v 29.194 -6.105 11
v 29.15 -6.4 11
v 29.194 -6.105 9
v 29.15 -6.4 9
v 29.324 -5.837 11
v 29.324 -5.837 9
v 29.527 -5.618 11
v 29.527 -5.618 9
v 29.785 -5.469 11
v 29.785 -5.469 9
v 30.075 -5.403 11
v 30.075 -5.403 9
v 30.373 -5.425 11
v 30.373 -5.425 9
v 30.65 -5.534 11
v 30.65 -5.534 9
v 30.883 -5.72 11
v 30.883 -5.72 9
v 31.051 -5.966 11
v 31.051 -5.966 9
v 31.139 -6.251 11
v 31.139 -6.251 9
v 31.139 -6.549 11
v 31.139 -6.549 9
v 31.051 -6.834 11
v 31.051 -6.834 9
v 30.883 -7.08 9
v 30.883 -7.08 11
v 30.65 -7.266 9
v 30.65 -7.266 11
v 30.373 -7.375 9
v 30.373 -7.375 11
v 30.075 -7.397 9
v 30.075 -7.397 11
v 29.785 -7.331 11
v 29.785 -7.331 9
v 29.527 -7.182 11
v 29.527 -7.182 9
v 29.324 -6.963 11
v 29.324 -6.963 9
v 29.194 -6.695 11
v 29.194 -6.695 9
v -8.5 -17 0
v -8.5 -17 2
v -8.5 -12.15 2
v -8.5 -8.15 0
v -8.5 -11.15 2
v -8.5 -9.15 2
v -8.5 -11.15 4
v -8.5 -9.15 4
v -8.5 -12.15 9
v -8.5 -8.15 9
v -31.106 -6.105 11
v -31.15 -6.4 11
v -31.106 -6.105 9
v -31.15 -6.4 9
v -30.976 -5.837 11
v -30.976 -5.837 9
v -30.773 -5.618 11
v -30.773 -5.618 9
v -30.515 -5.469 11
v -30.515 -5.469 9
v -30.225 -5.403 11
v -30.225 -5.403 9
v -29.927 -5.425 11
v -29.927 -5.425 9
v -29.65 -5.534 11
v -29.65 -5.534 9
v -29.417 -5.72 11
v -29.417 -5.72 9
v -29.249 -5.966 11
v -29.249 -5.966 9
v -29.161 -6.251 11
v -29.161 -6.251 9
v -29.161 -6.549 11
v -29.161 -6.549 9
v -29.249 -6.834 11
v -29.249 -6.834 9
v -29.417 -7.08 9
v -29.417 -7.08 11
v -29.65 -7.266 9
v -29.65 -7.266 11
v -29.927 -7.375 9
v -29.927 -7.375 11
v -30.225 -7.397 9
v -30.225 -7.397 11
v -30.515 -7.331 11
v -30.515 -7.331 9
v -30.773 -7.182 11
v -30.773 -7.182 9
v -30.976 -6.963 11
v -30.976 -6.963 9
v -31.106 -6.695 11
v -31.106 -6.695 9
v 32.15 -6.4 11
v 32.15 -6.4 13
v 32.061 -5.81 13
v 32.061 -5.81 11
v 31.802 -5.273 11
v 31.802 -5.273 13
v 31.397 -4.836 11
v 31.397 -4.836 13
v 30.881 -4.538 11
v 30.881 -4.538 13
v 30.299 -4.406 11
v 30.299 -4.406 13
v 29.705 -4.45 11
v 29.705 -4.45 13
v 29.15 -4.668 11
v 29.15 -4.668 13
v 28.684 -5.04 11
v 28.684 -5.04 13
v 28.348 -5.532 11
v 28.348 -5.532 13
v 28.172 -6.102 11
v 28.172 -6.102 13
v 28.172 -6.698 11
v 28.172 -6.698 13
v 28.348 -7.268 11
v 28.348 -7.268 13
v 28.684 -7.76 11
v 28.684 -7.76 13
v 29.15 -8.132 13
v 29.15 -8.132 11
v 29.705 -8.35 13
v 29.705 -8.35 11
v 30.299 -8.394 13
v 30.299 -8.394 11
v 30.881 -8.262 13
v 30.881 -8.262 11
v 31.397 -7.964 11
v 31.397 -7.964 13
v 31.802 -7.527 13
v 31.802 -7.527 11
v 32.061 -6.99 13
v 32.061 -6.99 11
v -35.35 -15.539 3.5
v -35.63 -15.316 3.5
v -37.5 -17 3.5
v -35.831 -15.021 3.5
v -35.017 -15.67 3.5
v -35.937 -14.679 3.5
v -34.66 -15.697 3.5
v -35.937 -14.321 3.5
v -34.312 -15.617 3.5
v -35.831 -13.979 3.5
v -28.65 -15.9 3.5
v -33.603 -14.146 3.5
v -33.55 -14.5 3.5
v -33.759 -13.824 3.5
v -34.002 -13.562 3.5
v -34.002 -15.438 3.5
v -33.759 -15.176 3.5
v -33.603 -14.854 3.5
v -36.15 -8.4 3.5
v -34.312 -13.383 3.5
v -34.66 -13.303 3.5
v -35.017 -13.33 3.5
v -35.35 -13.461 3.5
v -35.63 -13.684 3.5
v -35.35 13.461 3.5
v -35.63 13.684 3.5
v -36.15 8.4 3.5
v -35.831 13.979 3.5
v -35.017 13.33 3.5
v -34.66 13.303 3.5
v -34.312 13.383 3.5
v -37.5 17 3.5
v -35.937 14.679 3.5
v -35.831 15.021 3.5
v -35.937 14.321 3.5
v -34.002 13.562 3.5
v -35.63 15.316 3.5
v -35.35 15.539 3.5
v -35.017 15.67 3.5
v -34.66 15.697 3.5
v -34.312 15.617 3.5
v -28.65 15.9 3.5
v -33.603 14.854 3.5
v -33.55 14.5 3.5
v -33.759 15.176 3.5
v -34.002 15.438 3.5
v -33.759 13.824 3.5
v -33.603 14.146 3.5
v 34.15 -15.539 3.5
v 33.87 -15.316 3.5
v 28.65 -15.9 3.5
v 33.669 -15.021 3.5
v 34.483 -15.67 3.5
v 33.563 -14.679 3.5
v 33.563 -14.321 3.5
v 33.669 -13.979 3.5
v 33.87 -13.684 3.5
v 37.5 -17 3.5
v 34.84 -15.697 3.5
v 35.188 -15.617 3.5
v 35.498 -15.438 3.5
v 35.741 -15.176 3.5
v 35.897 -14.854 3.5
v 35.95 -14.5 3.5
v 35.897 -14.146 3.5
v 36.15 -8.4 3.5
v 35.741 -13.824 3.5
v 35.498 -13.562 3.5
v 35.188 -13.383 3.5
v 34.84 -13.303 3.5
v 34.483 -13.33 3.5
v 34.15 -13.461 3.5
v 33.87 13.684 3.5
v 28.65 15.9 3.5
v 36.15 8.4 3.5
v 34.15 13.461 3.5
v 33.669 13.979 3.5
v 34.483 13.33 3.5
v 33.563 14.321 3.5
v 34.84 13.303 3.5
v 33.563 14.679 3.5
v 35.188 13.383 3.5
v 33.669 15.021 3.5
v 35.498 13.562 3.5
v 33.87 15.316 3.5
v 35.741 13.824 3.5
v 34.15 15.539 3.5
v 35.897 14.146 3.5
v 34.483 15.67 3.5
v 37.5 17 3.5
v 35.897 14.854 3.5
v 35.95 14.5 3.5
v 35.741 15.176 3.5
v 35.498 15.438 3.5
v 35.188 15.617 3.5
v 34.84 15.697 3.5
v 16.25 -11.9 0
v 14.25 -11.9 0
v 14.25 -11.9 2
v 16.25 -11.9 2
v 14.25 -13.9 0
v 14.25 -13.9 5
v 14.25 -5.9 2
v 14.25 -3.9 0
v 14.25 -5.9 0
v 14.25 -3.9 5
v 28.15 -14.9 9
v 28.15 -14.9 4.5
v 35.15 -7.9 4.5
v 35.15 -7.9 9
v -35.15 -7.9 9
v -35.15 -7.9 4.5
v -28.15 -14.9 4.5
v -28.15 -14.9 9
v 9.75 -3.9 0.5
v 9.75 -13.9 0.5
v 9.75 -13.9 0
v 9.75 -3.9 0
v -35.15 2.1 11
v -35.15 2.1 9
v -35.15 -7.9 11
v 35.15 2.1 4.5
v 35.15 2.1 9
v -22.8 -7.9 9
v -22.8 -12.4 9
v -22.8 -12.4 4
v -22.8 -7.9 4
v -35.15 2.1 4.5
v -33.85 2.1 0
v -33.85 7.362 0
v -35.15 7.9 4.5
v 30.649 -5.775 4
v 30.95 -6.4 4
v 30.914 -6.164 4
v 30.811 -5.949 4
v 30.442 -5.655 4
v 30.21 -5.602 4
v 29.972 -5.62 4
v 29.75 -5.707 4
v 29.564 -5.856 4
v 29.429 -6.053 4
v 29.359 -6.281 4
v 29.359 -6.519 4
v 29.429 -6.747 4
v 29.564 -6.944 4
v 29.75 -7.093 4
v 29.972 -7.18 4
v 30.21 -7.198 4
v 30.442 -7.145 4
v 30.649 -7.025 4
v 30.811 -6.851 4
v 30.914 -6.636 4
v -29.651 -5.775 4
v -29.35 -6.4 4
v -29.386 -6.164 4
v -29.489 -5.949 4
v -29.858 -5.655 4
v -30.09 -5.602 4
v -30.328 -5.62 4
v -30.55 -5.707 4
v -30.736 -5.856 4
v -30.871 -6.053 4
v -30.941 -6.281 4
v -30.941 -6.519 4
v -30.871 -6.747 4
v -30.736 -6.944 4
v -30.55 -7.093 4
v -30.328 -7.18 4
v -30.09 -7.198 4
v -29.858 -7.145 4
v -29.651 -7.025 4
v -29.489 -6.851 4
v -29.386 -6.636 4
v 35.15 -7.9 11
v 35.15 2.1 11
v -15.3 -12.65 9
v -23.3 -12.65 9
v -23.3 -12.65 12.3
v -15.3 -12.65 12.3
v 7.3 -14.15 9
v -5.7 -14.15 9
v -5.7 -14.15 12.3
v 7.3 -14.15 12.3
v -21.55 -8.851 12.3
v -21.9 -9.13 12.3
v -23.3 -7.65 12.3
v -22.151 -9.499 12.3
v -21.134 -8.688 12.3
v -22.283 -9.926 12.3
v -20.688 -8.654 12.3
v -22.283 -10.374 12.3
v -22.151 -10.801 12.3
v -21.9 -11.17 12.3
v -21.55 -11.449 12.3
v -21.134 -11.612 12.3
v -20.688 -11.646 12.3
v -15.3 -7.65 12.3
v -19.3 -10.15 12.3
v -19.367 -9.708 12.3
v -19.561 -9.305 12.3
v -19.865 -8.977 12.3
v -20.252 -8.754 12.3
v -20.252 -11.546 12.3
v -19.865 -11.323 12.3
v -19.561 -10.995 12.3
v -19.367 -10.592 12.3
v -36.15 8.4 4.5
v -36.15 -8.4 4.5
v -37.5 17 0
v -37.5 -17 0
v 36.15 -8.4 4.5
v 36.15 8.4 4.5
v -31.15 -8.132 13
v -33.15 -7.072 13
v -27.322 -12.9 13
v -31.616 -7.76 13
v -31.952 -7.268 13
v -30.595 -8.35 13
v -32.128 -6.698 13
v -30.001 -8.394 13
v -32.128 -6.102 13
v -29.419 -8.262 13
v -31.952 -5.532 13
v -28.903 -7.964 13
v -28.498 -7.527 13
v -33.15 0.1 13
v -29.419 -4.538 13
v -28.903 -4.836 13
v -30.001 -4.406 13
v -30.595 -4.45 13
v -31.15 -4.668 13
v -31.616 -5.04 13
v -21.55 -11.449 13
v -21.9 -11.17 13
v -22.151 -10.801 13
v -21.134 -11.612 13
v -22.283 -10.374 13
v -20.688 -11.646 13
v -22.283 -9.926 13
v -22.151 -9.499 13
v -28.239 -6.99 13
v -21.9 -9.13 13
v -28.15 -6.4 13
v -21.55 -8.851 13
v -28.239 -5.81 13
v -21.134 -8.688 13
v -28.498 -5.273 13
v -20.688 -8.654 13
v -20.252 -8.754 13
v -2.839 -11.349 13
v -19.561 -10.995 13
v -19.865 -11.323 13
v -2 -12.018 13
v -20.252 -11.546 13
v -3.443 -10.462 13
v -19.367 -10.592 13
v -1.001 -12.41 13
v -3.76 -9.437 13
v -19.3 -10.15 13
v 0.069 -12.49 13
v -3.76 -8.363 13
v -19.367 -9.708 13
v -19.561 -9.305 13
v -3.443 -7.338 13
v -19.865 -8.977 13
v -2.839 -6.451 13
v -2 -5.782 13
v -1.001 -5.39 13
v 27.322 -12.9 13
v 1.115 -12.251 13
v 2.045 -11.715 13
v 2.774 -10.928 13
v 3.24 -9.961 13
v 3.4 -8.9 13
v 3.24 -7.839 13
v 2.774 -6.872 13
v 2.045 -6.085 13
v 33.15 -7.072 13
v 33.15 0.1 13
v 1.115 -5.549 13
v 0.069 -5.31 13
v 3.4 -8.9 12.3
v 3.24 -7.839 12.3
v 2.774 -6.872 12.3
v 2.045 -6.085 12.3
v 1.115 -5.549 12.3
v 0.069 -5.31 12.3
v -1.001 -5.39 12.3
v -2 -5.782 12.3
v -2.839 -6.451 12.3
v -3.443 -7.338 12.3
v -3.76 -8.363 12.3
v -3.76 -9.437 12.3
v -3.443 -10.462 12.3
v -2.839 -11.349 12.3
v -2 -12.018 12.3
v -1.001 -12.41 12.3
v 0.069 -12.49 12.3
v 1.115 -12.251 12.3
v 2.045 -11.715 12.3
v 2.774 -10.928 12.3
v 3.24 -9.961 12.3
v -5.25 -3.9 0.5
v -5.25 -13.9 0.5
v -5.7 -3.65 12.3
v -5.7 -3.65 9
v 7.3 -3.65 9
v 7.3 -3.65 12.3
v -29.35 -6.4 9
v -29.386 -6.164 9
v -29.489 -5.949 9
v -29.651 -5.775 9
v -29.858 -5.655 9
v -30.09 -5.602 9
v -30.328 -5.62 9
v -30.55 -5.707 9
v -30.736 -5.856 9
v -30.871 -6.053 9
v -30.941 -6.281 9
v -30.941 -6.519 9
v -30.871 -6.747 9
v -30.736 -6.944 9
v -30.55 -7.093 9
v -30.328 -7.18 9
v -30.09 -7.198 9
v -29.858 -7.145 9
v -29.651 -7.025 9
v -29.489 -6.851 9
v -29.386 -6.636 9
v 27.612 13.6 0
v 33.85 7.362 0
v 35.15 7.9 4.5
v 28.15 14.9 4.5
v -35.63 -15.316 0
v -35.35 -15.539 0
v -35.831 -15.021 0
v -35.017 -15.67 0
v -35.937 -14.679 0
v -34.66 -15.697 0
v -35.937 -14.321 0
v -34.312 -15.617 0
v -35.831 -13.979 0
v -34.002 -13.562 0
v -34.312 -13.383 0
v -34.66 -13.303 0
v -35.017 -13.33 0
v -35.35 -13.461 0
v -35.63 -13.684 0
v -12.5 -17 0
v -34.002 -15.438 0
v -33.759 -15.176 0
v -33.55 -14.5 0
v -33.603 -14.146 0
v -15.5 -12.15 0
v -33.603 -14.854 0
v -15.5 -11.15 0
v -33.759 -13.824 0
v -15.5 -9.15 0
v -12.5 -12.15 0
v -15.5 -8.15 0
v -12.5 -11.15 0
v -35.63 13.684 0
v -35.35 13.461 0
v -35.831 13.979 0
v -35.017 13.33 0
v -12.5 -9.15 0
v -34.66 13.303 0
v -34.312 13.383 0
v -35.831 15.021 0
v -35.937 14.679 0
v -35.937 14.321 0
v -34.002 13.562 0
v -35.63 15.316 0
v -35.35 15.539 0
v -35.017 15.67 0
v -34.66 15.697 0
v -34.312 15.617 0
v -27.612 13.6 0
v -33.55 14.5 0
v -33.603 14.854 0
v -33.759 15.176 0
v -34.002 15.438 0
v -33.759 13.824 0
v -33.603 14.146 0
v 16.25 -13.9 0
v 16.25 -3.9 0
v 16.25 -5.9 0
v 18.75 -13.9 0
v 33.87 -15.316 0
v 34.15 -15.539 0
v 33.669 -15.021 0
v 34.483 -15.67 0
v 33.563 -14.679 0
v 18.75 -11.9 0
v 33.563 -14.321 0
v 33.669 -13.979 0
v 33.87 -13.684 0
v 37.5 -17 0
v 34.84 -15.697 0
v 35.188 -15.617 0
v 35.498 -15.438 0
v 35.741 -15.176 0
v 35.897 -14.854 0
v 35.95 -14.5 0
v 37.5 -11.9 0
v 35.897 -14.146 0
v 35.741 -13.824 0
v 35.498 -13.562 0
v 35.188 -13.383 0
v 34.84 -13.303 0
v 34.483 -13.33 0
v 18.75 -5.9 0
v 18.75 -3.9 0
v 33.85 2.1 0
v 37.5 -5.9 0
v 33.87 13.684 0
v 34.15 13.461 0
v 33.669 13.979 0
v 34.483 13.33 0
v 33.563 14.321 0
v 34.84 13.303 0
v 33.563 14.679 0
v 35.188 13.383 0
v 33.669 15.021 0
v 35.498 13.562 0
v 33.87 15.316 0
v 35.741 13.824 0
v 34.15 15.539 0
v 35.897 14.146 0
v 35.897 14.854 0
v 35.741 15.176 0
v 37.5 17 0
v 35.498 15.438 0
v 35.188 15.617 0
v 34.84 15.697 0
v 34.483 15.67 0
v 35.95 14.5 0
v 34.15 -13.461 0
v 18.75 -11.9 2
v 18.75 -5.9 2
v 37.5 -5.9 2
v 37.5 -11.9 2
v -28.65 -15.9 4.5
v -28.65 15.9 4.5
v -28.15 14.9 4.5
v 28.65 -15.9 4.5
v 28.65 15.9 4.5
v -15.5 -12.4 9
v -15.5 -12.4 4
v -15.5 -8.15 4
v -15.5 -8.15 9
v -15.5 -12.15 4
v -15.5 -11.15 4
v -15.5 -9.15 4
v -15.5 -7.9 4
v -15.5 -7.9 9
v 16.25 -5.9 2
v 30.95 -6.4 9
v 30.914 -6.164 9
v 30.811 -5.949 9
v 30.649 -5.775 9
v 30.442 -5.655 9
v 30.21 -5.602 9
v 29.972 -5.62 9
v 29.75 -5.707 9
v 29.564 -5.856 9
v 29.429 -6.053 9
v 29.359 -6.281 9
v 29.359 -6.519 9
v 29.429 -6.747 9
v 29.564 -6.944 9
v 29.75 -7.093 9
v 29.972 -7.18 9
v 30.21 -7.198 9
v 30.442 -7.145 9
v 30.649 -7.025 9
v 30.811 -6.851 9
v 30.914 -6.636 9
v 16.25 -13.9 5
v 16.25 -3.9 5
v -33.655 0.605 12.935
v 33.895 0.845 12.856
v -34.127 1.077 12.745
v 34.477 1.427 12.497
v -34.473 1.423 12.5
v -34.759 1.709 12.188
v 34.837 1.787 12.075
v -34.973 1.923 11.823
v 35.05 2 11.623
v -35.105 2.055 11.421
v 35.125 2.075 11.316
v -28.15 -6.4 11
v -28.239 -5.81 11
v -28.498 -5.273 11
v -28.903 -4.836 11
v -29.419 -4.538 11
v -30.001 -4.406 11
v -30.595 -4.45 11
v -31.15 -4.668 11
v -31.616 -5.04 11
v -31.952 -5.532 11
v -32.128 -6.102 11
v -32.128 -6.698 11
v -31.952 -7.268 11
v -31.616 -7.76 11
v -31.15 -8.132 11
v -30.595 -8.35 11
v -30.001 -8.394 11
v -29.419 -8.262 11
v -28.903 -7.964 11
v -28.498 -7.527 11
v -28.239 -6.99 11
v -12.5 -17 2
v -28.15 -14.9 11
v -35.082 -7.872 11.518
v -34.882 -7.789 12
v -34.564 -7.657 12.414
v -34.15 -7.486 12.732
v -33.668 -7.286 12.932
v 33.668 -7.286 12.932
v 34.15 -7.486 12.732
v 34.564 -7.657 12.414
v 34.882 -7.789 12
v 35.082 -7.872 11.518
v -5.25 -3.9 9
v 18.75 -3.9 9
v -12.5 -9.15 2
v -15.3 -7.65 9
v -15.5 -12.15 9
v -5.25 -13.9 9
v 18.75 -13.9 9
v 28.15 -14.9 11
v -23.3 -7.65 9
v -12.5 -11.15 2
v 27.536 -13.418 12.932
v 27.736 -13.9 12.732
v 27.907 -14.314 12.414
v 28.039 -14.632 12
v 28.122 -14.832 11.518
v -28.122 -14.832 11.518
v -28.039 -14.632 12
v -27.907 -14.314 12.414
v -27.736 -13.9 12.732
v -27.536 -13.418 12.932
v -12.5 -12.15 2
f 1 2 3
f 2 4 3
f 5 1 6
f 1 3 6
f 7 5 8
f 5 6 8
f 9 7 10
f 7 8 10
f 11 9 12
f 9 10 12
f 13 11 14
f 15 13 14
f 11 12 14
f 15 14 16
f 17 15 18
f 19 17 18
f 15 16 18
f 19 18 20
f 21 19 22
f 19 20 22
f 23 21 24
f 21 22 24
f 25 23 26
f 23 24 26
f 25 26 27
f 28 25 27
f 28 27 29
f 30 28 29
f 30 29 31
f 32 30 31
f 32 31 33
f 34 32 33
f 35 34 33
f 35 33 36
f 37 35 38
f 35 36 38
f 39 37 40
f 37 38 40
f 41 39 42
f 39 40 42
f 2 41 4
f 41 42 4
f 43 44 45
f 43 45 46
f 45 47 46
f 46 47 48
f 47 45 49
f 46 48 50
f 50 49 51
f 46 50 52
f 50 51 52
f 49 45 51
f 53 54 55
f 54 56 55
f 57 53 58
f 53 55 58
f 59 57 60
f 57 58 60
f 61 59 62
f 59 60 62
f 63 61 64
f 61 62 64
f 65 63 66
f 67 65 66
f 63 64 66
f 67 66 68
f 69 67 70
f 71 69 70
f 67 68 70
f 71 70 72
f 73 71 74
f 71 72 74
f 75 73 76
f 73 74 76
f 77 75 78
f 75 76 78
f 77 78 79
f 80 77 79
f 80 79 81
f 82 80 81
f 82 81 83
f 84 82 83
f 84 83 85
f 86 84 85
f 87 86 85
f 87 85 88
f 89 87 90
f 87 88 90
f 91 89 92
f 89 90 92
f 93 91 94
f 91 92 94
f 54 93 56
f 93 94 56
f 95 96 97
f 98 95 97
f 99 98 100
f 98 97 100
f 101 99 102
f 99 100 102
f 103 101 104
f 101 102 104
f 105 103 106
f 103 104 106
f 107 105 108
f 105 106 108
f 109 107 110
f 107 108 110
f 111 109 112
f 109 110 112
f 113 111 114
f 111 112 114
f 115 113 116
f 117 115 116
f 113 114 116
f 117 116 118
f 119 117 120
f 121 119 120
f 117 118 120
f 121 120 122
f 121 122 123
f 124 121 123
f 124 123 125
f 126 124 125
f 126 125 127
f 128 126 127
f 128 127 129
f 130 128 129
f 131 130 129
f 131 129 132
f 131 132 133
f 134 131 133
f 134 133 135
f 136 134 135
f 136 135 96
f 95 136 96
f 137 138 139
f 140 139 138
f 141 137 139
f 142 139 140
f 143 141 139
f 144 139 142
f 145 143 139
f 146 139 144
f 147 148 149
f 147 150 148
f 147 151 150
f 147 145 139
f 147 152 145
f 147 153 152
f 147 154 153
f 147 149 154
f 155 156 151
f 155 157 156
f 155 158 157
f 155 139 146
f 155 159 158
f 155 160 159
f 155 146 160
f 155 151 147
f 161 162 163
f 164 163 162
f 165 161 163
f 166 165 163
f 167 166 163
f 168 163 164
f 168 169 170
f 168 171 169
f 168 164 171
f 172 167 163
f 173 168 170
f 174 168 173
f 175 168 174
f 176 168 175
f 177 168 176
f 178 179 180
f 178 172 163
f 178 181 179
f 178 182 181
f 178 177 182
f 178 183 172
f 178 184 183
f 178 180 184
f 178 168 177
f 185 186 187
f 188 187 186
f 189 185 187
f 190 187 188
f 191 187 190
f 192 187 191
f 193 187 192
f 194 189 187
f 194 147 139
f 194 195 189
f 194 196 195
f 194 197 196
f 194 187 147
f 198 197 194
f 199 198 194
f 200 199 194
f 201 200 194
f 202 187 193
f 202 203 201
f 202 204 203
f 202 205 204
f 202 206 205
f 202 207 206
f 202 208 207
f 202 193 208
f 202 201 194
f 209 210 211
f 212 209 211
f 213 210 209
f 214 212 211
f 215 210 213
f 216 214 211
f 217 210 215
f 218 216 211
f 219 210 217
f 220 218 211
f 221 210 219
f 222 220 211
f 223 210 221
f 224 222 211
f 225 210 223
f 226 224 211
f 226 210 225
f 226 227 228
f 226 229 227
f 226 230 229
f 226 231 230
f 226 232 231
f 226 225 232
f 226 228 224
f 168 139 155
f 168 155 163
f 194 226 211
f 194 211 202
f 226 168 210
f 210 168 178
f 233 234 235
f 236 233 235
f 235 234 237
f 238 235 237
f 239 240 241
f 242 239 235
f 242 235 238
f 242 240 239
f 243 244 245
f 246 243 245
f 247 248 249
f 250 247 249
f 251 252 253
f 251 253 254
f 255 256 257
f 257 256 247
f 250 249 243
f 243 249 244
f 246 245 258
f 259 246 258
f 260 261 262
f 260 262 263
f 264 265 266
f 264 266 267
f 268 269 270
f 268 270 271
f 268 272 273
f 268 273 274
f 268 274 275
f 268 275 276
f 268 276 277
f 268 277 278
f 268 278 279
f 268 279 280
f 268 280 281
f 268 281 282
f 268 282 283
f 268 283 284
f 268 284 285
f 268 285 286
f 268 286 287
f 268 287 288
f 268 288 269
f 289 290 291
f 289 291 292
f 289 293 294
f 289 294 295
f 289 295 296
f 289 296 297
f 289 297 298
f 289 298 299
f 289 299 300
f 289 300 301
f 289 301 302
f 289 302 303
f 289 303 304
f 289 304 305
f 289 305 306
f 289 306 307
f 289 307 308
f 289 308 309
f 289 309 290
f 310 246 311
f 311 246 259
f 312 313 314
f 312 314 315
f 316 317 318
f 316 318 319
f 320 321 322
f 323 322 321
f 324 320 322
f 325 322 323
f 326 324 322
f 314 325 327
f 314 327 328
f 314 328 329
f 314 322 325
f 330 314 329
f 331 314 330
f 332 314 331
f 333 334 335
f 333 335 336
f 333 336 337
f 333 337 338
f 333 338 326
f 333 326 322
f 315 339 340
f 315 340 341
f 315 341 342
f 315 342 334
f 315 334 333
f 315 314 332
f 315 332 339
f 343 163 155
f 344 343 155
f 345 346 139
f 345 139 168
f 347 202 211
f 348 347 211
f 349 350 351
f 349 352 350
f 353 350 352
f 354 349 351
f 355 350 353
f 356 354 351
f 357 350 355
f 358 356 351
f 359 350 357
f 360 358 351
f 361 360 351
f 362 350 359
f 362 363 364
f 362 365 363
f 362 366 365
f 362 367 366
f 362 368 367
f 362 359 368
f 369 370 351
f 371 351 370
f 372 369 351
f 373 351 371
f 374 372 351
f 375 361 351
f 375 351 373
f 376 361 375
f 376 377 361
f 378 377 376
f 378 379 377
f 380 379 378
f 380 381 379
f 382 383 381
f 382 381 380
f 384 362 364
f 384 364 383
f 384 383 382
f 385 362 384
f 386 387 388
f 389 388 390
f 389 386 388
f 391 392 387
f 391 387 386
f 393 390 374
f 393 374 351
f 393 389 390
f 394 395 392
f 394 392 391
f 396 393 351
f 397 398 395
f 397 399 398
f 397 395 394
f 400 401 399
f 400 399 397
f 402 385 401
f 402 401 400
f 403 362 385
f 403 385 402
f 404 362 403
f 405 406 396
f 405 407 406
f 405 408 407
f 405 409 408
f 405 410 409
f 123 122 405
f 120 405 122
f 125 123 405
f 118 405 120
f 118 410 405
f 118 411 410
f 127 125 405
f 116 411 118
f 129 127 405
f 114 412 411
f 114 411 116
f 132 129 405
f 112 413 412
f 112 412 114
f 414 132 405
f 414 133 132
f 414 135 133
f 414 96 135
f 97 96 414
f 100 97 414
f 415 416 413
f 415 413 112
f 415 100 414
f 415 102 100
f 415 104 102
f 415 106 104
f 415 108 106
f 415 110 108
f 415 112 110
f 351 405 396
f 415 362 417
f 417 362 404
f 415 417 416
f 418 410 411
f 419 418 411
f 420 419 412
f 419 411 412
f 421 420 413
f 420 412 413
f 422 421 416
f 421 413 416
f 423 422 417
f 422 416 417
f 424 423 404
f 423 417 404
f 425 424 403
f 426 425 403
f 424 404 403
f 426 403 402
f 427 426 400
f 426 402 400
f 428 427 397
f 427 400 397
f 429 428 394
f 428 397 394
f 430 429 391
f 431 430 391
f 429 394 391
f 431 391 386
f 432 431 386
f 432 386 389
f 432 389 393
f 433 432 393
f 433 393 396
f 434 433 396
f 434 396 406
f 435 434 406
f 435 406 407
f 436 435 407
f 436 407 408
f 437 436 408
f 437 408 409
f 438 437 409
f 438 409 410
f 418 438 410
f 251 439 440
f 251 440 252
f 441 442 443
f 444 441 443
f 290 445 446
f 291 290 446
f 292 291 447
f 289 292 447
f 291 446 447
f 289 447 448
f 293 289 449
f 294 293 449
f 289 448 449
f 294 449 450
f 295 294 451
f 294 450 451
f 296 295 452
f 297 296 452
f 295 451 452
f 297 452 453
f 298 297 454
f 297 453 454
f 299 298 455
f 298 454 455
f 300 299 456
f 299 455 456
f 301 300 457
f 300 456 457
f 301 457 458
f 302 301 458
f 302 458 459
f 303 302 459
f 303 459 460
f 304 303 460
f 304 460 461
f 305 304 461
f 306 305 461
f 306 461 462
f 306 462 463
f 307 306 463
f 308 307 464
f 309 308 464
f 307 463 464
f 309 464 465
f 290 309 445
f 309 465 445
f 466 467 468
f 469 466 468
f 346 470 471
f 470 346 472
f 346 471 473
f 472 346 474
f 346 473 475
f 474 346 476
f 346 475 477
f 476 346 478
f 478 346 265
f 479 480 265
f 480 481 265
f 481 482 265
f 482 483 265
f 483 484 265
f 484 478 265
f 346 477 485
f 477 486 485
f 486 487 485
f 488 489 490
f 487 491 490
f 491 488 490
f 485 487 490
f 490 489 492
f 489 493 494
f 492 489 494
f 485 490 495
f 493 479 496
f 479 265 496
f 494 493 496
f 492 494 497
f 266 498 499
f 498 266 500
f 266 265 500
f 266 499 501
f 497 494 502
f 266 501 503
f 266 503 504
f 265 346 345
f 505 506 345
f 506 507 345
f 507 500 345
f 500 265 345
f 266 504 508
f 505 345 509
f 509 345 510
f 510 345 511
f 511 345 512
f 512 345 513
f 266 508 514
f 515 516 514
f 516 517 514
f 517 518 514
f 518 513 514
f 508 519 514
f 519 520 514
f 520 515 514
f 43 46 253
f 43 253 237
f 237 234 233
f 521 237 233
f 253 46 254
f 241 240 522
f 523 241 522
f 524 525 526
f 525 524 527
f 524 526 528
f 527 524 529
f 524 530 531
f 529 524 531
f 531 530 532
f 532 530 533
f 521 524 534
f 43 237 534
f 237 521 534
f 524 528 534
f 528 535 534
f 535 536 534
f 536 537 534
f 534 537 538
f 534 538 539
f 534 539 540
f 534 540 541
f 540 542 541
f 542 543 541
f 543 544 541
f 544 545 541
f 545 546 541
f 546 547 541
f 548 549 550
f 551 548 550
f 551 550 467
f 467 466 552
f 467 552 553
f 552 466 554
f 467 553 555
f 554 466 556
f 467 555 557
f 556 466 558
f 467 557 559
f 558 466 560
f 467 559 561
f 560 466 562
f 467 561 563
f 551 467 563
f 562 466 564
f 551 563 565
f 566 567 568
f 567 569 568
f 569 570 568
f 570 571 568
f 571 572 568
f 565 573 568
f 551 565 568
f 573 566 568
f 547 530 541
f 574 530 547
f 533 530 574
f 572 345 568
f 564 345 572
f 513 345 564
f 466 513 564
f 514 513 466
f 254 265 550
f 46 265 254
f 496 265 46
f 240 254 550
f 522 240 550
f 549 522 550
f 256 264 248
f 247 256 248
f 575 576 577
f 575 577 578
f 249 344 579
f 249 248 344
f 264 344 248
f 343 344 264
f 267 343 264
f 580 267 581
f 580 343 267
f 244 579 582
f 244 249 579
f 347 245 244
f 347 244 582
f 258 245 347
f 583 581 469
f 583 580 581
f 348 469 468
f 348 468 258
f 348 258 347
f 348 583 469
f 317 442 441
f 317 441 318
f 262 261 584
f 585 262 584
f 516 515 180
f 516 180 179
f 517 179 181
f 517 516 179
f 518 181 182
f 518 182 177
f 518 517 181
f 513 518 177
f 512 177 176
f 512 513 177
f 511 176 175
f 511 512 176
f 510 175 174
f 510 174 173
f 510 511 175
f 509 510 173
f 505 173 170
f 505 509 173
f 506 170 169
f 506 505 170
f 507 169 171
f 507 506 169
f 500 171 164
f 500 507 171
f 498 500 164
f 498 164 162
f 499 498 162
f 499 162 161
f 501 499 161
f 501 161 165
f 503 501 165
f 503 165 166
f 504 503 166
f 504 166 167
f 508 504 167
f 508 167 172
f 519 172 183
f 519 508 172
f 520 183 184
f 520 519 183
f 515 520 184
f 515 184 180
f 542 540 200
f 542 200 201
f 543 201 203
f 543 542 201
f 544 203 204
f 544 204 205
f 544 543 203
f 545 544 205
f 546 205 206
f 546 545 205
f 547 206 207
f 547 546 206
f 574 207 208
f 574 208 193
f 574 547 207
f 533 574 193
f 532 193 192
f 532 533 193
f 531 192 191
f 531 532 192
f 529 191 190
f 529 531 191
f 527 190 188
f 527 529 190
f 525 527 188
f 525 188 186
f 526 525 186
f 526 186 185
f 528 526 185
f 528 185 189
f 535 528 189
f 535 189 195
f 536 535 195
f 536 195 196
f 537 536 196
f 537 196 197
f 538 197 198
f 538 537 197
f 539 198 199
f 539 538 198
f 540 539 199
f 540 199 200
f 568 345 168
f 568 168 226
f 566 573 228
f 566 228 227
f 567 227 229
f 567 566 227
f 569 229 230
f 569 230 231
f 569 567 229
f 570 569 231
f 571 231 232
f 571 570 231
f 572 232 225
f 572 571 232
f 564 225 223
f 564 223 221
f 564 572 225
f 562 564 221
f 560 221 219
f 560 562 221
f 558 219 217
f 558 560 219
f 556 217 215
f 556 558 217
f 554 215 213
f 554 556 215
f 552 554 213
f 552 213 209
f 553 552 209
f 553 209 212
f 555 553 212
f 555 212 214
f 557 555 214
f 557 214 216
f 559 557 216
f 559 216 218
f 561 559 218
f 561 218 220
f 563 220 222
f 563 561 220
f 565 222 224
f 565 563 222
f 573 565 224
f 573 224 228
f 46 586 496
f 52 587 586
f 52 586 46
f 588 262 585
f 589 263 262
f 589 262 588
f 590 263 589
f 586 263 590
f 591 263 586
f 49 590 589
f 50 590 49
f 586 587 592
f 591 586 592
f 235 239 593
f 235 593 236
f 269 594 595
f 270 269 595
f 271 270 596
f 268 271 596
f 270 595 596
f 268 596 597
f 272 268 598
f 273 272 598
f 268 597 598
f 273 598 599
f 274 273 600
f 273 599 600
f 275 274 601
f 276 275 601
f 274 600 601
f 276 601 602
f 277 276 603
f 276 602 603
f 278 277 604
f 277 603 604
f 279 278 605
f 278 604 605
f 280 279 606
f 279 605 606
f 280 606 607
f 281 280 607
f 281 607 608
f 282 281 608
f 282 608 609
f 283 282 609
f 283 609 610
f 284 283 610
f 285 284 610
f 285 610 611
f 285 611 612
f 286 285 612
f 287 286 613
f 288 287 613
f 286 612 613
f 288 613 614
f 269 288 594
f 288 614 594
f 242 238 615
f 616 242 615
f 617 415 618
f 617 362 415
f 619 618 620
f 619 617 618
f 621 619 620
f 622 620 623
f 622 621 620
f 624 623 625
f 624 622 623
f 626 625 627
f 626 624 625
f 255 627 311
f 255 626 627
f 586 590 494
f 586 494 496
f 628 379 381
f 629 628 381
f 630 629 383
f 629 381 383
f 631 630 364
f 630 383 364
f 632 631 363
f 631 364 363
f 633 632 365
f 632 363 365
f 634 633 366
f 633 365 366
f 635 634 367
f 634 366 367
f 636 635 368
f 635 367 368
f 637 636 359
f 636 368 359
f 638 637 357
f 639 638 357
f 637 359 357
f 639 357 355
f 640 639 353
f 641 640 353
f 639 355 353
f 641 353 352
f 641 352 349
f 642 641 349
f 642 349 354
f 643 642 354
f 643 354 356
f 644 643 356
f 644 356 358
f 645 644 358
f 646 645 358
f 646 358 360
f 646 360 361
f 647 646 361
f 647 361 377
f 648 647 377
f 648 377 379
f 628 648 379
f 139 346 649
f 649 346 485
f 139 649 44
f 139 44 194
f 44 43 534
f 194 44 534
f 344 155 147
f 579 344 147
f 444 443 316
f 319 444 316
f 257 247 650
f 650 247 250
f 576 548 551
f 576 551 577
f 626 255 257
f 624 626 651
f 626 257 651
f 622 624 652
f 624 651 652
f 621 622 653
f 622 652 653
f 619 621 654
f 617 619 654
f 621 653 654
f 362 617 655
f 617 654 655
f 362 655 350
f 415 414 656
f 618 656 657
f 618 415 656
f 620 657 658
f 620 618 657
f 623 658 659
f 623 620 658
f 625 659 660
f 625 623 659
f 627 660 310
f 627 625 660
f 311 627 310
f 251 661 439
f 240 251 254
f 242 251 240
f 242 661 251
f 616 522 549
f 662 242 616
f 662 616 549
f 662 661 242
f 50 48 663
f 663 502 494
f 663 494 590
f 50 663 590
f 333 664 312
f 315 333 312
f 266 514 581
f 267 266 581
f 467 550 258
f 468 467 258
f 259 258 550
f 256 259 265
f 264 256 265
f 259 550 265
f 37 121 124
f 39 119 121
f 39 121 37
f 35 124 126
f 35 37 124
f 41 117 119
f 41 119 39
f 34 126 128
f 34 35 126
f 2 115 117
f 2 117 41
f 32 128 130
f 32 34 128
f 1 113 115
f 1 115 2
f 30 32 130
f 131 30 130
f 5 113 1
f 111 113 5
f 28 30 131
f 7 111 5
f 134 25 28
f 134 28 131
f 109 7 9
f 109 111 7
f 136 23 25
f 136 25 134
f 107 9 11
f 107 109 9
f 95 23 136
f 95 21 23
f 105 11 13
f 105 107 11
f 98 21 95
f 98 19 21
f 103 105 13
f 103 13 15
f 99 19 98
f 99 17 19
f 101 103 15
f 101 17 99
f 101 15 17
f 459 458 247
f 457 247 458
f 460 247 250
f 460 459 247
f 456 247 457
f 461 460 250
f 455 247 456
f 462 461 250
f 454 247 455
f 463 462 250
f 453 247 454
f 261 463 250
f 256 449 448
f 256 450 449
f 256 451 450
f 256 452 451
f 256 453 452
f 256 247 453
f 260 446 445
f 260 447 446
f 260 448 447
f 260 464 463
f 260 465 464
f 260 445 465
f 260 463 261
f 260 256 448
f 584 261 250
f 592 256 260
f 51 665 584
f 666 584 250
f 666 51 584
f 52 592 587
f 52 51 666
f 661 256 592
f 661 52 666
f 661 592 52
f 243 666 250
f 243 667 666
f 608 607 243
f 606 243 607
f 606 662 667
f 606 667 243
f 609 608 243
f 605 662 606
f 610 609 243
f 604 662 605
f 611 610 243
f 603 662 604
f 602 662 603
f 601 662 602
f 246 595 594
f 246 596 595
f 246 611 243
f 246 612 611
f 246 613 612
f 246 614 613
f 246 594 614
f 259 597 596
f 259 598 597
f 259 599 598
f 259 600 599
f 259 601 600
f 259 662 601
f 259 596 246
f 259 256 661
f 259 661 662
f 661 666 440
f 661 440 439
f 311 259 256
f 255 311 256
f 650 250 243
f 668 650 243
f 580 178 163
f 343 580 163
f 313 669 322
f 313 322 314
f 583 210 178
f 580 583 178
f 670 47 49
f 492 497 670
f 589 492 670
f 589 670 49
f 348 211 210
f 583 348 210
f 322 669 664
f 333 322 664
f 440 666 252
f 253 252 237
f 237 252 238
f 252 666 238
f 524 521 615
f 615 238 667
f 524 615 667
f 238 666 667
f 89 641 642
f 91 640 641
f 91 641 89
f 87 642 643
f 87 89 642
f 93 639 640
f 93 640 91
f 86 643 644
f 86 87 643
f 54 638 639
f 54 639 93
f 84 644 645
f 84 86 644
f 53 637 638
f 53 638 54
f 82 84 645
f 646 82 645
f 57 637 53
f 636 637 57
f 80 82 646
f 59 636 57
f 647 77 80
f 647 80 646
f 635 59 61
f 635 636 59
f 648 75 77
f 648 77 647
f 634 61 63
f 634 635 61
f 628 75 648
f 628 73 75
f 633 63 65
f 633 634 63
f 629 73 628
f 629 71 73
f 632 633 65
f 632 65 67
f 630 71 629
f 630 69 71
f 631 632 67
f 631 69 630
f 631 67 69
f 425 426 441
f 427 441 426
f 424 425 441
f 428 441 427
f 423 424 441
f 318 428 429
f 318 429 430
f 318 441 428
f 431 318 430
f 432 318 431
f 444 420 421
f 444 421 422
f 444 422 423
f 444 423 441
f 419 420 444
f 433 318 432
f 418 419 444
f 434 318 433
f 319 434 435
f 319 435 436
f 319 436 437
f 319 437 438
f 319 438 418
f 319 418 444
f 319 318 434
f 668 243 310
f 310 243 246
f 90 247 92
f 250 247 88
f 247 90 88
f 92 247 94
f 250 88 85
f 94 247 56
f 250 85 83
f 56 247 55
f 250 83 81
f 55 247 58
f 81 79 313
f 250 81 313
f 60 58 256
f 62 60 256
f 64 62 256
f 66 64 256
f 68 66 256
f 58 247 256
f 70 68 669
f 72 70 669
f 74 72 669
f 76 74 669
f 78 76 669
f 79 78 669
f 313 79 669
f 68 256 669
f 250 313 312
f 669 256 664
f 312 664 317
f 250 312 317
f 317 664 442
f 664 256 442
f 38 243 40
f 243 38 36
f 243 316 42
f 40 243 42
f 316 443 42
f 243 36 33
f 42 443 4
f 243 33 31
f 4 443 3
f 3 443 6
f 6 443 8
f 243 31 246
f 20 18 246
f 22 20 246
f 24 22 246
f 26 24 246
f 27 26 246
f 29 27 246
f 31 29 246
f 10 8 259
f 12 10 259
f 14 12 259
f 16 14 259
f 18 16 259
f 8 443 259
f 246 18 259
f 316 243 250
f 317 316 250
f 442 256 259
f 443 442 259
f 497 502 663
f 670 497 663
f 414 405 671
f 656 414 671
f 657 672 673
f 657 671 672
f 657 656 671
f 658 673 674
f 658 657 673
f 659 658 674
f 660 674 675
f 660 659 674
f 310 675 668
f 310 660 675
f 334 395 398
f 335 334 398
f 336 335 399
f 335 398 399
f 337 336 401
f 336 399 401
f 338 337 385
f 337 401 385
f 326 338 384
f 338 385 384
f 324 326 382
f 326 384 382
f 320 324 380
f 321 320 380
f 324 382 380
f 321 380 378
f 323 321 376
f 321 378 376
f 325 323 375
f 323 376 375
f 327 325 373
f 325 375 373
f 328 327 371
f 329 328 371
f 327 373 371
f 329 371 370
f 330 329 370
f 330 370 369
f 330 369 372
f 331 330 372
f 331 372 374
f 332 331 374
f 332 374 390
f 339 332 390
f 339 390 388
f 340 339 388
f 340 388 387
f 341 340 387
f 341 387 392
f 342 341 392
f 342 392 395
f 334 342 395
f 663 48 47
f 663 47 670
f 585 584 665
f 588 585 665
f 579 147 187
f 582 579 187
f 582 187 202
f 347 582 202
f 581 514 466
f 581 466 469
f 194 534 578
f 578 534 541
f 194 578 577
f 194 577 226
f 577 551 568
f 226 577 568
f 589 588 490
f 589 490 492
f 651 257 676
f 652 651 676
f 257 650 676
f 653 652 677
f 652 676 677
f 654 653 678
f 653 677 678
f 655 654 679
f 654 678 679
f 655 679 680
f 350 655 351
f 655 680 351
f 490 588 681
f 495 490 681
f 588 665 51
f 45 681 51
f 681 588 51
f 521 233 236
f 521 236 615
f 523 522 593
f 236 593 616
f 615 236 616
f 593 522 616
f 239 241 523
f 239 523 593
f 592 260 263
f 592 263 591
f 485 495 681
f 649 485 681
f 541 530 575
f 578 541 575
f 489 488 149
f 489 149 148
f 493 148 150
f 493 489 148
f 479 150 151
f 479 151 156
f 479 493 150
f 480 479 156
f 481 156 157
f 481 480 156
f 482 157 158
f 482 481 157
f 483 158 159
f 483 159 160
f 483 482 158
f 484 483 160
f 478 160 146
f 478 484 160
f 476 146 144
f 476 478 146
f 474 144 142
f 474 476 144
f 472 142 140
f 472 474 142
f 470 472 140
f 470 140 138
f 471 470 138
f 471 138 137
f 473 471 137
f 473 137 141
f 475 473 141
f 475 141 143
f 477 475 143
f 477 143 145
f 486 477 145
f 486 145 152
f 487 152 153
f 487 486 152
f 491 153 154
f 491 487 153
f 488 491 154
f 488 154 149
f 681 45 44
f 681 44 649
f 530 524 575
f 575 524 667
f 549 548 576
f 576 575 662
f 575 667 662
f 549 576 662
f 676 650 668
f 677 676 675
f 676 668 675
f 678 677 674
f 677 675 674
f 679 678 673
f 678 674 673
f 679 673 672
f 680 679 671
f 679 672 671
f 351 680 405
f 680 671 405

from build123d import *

# Parameters (mm, degrees)
F0_W            = 75
F0_H            = 34
F0_R            = 1.2
F1_DEPTH        = 3.5
F3_DEPTH        = 1
F5_DEPTH        = 5
F11_DEPTH       = 9
F12_W           = 15
F12_H           = 10
F13_DEPTH       = 8.5
F14_W           = 7.3
F14_H           = 4.5
F15_DEPTH       = 5
F16_W           = 9
F16_H           = 10
F16_W_2         = 7
F16_H_2         = 4
F17_DEPTH       = 25
F18_W           = 2
F18_H           = 5
F19_DEPTH       = 10
F20_W           = 6
F20_H           = 2
F21_DEPTH       = 25
F22_R           = 0.8
F23_DEPTH       = 5
F26_DEPTH       = 4
F27_R           = 3.6
F27_R_2         = 1.5
F28_DEPTH       = 25
F29_W           = 13
F29_H           = 10.5
F29_W_2         = 8
F29_H_2         = 5
F30_DEPTH       = 3.3
F31_W           = 2
F31_H           = 4
F32_DEPTH       = 7
F33_W           = 4
F33_H           = 2
F34_DEPTH       = 25
F36_D           = 2
F36_DEPTH       = 10
F36_CBORE_D     = 4
F36_CBORE_DEPTH = 2
F36_TIP         = 0.600860619
F37_R           = 2


with BuildPart() as f1:
    # F0 (on Top) → F1 (new body)
    with BuildSketch(Plane.XY):
        Rectangle(F0_W, F0_H)
        with Locations((-34.75, -14.5)):
            Circle(F0_R, mode=Mode.SUBTRACT)
        with Locations((34.75, -14.5)):
            Circle(F0_R, mode=Mode.SUBTRACT)
        with Locations((-34.75, 14.5)):
            Circle(F0_R, mode=Mode.SUBTRACT)
        with Locations((34.75, 14.5)):
            Circle(F0_R, mode=Mode.SUBTRACT)
    extrude(amount=F1_DEPTH)

    # F2 (on face) → F3 (join)
    with BuildSketch(Plane.XY.offset(3.5)):
        Polygon((28.65, 15.9), (-28.65, 15.9), (-36.15, 8.4), (-36.15, -8.4), (-28.65, -15.9), (28.65, -15.9), (36.15, -8.4), (36.15, 8.4), align=None)
    extrude(amount=F3_DEPTH)

    # F4 (on face) → F5 (cut)
    with BuildSketch(Plane.XY.offset(4.5)):
        Polygon((28.15, 14.9), (-28.15, 14.9), (-35.15, 7.9), (-35.15, -7.9), (-28.15, -14.9), (28.15, -14.9), (35.15, -7.9), (35.15, 7.9), align=None)
    extrude(amount=-F5_DEPTH, mode=Mode.SUBTRACT)

    # F9: sweep along a path in F8
    with BuildLine(Plane.XY.offset(4.5)) as f9_path:
        Line((-35.15, 2.1), (-35.15, 7.9))
        Line((-35.15, 7.9), (-28.15, 14.9))
        Line((-28.15, 14.9), (28.15, 14.9))
        Line((28.15, 14.9), (35.15, 7.9))
        Line((35.15, 7.9), (35.15, 2.1))
    # F7 (on offset) → F9 (sweep)
    with BuildSketch(Plane.XZ.offset(-2.1)):
        Polygon((-33.85, 0), (-35.15, 4.5), (-35.15, 0), align=None)
    sweep(path=f9_path.line, transition=Transition.RIGHT)

    # F10 (on Top) → F11 (join)
    with BuildSketch(Plane.XY):
        Polygon((-35.15, -7.9), (-28.15, -14.9), (28.15, -14.9), (35.15, -7.9), (35.15, 2.1), (-35.15, 2.1), align=None)
    extrude(amount=F11_DEPTH)

    # F12 (on face) → F13 (cut)
    with BuildSketch(Plane.XY.offset(9)):
        with Locations((2.25, -8.9)):
            Rectangle(F12_W, F12_H)
    extrude(amount=-F13_DEPTH, mode=Mode.SUBTRACT)

    # F14 (on face) → F15 (cut)
    with BuildSketch(Plane.XY.offset(9)):
        with Locations((-19.15, -10.15)):
            Rectangle(F14_W, F14_H)
    extrude(amount=-F15_DEPTH, mode=Mode.SUBTRACT)

    # F16 (on face) → F17 (cut)
    with BuildSketch(Plane.XY.offset(9)):
        with Locations((14.25, -8.9)):
            Rectangle(F16_W, F16_H)
        with Locations((-12, -10.15)):
            Rectangle(F16_W_2, F16_H_2)
    extrude(amount=-F17_DEPTH, mode=Mode.SUBTRACT)

    # F18 (on face) → F19 (join)
    with BuildSketch(Plane.XZ.offset(3.9)):
        with Locations((15.25, 2.5)):
            Rectangle(F18_W, F18_H)
    extrude(amount=F19_DEPTH)

    # F20 (on face) → F21 (cut)
    with BuildSketch(Plane(origin=(14.25, 0, 0), x_dir=(0, -1, 0), z_dir=(-1, 0, 0))):
        with Locations((8.9, 1)):
            Rectangle(F20_W, F20_H)
    extrude(amount=-F21_DEPTH, mode=Mode.SUBTRACT)

    # F22 (on face) → F23 (cut)
    with BuildSketch(Plane.XY.offset(9)):
        with Locations((-30.15, -6.4)):
            Circle(F22_R)
        with Locations((30.15, -6.4)):
            Circle(F22_R)
    extrude(amount=-F23_DEPTH, mode=Mode.SUBTRACT)

    # F31 (on face) → F32 (join)
    with BuildSketch(Plane.YZ.offset(-15.5)):
        with Locations((-10.15, 2)):
            Rectangle(F31_W, F31_H)
    extrude(amount=F32_DEPTH)

    # F33 (on face) → F34 (cut)
    with BuildSketch(Plane(origin=(0, -9.15, 0), x_dir=(-1, 0, 0), z_dir=(0, 1, 0))):
        with Locations((10.5, 1)):
            Rectangle(F33_W, F33_H)
    extrude(amount=-F34_DEPTH, mode=Mode.SUBTRACT)


with BuildPart() as f26:
    # F25 (on offset) → F26 (new body)
    with BuildSketch(Plane.XY.offset(9)):
        Polygon((-35.15, -7.9), (-28.15, -14.9), (28.15, -14.9), (35.15, -7.9), (35.15, 2.1), (-35.15, 2.1), align=None)
    extrude(amount=F26_DEPTH)

    # F27 (on face) → F28 (cut)
    with BuildSketch(Plane.XY.offset(13)):
        with Locations((-0.2, -8.9)):
            Circle(F27_R)
        with Locations((-20.8, -10.15)):
            Circle(F27_R_2)
    extrude(amount=-F28_DEPTH, mode=Mode.SUBTRACT)

    # F29 (on face) → F30 (cut)
    with BuildSketch(Plane(origin=(0, 0, 9), x_dir=(1, 0, 0), z_dir=(0, 0, -1))):
        with Locations((0.8, 8.9)):
            Rectangle(F29_W, F29_H)
        with Locations((-19.3, 10.15)):
            Rectangle(F29_W_2, F29_H_2)
    extrude(amount=-F30_DEPTH, mode=Mode.SUBTRACT)

    # F36
    with Locations(Plane.XY.offset(13)):
        with Locations((-30.15, -6.4), (30.15, -6.4)):
            CounterBoreHole(F36_D / 2, F36_CBORE_D / 2, F36_CBORE_DEPTH, depth=F36_DEPTH)
            with Locations((0, 0, -(F36_DEPTH + F36_TIP / 2))):  # 118° drill point
                Cone(0, F36_D / 2, F36_TIP, mode=Mode.SUBTRACT)

    # F37
    f37_edges = [f26.edges().sort_by_distance(p)[0] for p in [
        (0, -14.9, 13),
        (-31.65, -11.4, 13),
        (-35.15, -2.9, 13),
        (0, 2.1, 13),
        (35.15, -2.9, 13),
        (31.65, -11.4, 13),
    ]]
    fillet(f37_edges, radius=F37_R)


solid = Compound([f1.part, f26.part])
